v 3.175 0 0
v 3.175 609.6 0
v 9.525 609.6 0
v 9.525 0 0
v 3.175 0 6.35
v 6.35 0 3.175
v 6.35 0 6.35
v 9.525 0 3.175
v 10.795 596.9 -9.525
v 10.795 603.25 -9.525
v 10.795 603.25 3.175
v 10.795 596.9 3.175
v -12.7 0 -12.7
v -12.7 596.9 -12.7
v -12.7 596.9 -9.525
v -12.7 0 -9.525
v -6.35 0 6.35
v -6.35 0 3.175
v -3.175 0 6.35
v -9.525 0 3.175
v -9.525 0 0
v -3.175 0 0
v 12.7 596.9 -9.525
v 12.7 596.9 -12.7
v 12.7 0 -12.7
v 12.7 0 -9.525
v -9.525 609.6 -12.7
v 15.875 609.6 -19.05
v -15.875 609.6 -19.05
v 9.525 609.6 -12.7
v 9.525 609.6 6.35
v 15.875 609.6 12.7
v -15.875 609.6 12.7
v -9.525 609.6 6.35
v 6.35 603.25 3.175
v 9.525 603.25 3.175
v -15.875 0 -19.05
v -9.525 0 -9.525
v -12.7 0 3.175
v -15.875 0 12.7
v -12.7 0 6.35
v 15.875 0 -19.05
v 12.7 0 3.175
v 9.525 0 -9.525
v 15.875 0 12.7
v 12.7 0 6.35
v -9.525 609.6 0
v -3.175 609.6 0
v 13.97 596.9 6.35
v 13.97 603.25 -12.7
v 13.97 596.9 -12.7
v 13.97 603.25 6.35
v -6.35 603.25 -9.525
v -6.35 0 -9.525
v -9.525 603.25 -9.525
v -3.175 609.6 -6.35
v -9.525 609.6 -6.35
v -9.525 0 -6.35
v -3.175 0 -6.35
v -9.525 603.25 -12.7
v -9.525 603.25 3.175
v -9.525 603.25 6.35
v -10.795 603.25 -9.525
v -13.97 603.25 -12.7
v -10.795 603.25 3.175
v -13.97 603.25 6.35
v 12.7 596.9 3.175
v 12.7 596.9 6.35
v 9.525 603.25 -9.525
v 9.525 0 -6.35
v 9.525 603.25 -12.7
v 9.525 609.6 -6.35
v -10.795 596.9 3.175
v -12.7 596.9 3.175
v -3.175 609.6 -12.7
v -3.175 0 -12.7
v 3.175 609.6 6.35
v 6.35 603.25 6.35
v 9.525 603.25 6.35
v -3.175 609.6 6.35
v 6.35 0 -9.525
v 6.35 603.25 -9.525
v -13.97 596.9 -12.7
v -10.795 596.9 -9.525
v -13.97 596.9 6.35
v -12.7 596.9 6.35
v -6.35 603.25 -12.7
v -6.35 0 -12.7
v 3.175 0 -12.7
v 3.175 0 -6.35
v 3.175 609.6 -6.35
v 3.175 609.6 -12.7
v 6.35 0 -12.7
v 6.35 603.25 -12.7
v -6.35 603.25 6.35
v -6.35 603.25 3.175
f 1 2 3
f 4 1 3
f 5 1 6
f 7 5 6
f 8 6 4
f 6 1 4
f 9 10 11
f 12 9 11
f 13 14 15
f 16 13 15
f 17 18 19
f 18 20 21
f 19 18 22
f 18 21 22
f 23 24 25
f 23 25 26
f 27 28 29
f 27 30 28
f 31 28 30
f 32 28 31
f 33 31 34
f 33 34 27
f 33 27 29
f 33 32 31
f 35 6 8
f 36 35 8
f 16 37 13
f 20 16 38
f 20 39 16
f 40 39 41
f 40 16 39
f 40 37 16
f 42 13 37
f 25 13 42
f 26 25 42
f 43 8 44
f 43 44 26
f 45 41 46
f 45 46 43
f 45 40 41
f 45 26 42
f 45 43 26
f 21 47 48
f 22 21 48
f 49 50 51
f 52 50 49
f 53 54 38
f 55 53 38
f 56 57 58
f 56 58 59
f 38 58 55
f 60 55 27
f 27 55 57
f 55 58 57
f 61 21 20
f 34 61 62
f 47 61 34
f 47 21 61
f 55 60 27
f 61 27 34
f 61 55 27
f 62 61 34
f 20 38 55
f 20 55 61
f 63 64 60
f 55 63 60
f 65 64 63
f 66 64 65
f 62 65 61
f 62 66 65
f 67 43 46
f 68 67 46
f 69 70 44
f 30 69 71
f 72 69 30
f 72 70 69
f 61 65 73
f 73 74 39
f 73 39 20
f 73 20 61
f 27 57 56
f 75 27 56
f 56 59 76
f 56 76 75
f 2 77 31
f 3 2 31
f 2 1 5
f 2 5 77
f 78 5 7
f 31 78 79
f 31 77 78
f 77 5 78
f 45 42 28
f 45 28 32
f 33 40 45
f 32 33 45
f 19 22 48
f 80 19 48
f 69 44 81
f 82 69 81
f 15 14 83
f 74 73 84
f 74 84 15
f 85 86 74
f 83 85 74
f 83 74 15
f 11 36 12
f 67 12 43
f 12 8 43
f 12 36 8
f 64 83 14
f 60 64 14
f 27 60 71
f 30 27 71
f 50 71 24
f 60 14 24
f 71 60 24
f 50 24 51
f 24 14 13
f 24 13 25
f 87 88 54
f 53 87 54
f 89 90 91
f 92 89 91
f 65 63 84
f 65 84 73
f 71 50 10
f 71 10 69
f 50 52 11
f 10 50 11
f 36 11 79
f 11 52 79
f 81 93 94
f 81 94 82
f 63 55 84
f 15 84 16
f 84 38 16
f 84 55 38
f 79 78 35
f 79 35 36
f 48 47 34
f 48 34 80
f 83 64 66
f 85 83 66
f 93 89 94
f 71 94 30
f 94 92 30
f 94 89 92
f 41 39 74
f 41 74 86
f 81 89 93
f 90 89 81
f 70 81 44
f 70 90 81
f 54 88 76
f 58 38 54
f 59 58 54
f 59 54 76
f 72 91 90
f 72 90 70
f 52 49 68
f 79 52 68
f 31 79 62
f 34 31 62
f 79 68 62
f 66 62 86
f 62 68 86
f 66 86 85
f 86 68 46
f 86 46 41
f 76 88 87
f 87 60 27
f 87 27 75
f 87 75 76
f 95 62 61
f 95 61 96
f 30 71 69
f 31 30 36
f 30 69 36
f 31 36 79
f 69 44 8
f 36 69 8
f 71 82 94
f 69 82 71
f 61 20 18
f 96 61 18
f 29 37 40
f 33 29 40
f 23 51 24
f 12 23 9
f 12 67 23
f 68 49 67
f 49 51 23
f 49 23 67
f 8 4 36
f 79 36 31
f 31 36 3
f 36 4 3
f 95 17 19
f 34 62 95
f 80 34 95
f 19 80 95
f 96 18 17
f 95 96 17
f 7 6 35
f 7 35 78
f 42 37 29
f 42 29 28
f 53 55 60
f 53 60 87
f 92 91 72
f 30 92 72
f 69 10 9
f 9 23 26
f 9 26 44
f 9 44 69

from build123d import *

# Parameters (mm, degrees)
F0_W      = 6.35
F0_H      = 609.6
F1_DEPTH  = 6.35
F2_DEPTH  = 12.7
F3_DEPTH  = 6.35
F4_W      = 31.75
F4_H      = 31.75
F4_W_2    = 19.05
F4_H_2    = 19.05
F5_DEPTH  = 609.6
F6_W      = 3.175
F6_H      = 3.175
F7_DEPTH  = 603.25
F8_W      = 3.175
F8_H      = 19.05
F9_DEPTH  = 12.7
F10_DEPTH = 6.35
F11_DEPTH = 12.7
F12_DEPTH = 6.35


with BuildPart() as f1:
    # F0 (on Top) → F1 (new body)
    with BuildSketch(Plane.XY):
        with Locations((-6.35, 304.8)):
            Rectangle(F0_W, F0_H)
    extrude(amount=F1_DEPTH)


with BuildPart() as f1b:
    # F0 (on Top) → F1, piece 2 (new body)
    with BuildSketch(Plane.XY):
        with Locations((6.35, 304.8)):
            Rectangle(F0_W, F0_H)
    extrude(amount=F1_DEPTH)


with BuildPart() as f2:
    # F0 (on Top) → F2 (new body)
    with BuildSketch(Plane.XY):
        with Locations((6.35, 304.8)):
            Rectangle(F0_W, F0_H)
    extrude(amount=-F2_DEPTH)


with BuildPart() as f2b:
    # F0 (on Top) → F2, piece 2 (new body)
    with BuildSketch(Plane.XY):
        with Locations((-6.35, 304.8)):
            Rectangle(F0_W, F0_H)
    extrude(amount=-F2_DEPTH)


with BuildPart() as f3_tool:
    # F0 (on Top) → F3 (new body)
    with BuildSketch(Plane.XY):
        with Locations((6.35, 304.8)):
            Rectangle(F0_W, F0_H)
        with Locations((-6.35, 304.8)):
            Rectangle(F0_W, F0_H)
    extrude(amount=-F3_DEPTH)


with BuildPart() as f2_1:
    add(f2.part)

    # F3: cut by f3_tool
    add(f3_tool.part, mode=Mode.SUBTRACT)


with BuildPart() as f2b_1:
    add(f2b.part)

    # F3: cut by f3_tool
    add(f3_tool.part, mode=Mode.SUBTRACT)


with BuildPart() as f5:
    # F4 (on Front) → F5 (new body)
    with BuildSketch(Plane.XZ):
        with Locations((0, -3.175)):
            Rectangle(F4_W, F4_H)
        with Locations((0, -3.175)):
            Rectangle(F4_W_2, F4_H_2, mode=Mode.SUBTRACT)
    extrude(amount=-F5_DEPTH)


with BuildPart() as f7_tool:
    # F6 (on face) → F7 (new body)
    with BuildSketch(Plane.XZ):
        with Locations((-11.1125, 4.7625)):
            Rectangle(F6_W, F6_H)
        with Locations((-7.9375, 4.7625)):
            Rectangle(F6_W, F6_H)
        with Locations((7.9375, 4.7625)):
            Rectangle(F6_W, F6_H)
        with Locations((11.1125, 4.7625)):
            Rectangle(F6_W, F6_H)
        with Locations((-11.1125, -11.1125)):
            Rectangle(F6_W, F6_H)
        with Locations((-7.9375, -11.1125)):
            Rectangle(F6_W, F6_H)
        with Locations((7.9375, -11.1125)):
            Rectangle(F6_W, F6_H)
        with Locations((11.1125, -11.1125)):
            Rectangle(F6_W, F6_H)
    extrude(amount=-F7_DEPTH)


with BuildPart() as f1_1:
    add(f1.part)

    # F7: cut by f7_tool
    add(f7_tool.part, mode=Mode.SUBTRACT)


with BuildPart() as f1b_1:
    add(f1b.part)

    # F7: cut by f7_tool
    add(f7_tool.part, mode=Mode.SUBTRACT)


with BuildPart() as f2_2:
    add(f2_1.part)

    # F7: cut by f7_tool
    add(f7_tool.part, mode=Mode.SUBTRACT)


with BuildPart() as f2b_2:
    add(f2b_1.part)

    # F7: cut by f7_tool
    add(f7_tool.part, mode=Mode.SUBTRACT)


with BuildPart() as f5_1:
    add(f5.part)

    # F7: cut by f7_tool
    add(f7_tool.part, mode=Mode.SUBTRACT)

    # F8 (on face) → F9 (cut)
    with BuildSketch(Plane(origin=(0, 609.6, 0), x_dir=(-1, 0, 0), z_dir=(0, 1, 0))):
        with Locations((-12.3825, -3.175)):
            Rectangle(F8_W, F8_H)
        with Locations((12.3825, -3.175)):
            Rectangle(F8_W, F8_H)
    extrude(amount=-F9_DEPTH, mode=Mode.SUBTRACT)

    # F8 (on face) → F10 (join)
    with BuildSketch(Plane(origin=(0, 609.6, 0), x_dir=(-1, 0, 0), z_dir=(0, 1, 0))):
        with Locations((-12.3825, -3.175)):
            Rectangle(F8_W, F8_H)
        with Locations((12.3825, -3.175)):
            Rectangle(F8_W, F8_H)
    extrude(amount=-F10_DEPTH)

    # F8 (on face) → F11 (cut)
    with BuildSketch(Plane(origin=(0, 609.6, 0), x_dir=(-1, 0, 0), z_dir=(0, 1, 0))):
        with Locations((12.3825, -3.175)):
            Rectangle(F8_W, F8_H)
    extrude(amount=-F11_DEPTH, mode=Mode.SUBTRACT)

    # F8 (on face) → F12 (join)
    with BuildSketch(Plane(origin=(0, 609.6, 0), x_dir=(-1, 0, 0), z_dir=(0, 1, 0))):
        with Locations((12.3825, -3.175)):
            Rectangle(F8_W, F8_H)
    extrude(amount=-F12_DEPTH)


solid = Compound([f1_1.part, f1b_1.part, f2_2.part, f2b_2.part, f5_1.part])
